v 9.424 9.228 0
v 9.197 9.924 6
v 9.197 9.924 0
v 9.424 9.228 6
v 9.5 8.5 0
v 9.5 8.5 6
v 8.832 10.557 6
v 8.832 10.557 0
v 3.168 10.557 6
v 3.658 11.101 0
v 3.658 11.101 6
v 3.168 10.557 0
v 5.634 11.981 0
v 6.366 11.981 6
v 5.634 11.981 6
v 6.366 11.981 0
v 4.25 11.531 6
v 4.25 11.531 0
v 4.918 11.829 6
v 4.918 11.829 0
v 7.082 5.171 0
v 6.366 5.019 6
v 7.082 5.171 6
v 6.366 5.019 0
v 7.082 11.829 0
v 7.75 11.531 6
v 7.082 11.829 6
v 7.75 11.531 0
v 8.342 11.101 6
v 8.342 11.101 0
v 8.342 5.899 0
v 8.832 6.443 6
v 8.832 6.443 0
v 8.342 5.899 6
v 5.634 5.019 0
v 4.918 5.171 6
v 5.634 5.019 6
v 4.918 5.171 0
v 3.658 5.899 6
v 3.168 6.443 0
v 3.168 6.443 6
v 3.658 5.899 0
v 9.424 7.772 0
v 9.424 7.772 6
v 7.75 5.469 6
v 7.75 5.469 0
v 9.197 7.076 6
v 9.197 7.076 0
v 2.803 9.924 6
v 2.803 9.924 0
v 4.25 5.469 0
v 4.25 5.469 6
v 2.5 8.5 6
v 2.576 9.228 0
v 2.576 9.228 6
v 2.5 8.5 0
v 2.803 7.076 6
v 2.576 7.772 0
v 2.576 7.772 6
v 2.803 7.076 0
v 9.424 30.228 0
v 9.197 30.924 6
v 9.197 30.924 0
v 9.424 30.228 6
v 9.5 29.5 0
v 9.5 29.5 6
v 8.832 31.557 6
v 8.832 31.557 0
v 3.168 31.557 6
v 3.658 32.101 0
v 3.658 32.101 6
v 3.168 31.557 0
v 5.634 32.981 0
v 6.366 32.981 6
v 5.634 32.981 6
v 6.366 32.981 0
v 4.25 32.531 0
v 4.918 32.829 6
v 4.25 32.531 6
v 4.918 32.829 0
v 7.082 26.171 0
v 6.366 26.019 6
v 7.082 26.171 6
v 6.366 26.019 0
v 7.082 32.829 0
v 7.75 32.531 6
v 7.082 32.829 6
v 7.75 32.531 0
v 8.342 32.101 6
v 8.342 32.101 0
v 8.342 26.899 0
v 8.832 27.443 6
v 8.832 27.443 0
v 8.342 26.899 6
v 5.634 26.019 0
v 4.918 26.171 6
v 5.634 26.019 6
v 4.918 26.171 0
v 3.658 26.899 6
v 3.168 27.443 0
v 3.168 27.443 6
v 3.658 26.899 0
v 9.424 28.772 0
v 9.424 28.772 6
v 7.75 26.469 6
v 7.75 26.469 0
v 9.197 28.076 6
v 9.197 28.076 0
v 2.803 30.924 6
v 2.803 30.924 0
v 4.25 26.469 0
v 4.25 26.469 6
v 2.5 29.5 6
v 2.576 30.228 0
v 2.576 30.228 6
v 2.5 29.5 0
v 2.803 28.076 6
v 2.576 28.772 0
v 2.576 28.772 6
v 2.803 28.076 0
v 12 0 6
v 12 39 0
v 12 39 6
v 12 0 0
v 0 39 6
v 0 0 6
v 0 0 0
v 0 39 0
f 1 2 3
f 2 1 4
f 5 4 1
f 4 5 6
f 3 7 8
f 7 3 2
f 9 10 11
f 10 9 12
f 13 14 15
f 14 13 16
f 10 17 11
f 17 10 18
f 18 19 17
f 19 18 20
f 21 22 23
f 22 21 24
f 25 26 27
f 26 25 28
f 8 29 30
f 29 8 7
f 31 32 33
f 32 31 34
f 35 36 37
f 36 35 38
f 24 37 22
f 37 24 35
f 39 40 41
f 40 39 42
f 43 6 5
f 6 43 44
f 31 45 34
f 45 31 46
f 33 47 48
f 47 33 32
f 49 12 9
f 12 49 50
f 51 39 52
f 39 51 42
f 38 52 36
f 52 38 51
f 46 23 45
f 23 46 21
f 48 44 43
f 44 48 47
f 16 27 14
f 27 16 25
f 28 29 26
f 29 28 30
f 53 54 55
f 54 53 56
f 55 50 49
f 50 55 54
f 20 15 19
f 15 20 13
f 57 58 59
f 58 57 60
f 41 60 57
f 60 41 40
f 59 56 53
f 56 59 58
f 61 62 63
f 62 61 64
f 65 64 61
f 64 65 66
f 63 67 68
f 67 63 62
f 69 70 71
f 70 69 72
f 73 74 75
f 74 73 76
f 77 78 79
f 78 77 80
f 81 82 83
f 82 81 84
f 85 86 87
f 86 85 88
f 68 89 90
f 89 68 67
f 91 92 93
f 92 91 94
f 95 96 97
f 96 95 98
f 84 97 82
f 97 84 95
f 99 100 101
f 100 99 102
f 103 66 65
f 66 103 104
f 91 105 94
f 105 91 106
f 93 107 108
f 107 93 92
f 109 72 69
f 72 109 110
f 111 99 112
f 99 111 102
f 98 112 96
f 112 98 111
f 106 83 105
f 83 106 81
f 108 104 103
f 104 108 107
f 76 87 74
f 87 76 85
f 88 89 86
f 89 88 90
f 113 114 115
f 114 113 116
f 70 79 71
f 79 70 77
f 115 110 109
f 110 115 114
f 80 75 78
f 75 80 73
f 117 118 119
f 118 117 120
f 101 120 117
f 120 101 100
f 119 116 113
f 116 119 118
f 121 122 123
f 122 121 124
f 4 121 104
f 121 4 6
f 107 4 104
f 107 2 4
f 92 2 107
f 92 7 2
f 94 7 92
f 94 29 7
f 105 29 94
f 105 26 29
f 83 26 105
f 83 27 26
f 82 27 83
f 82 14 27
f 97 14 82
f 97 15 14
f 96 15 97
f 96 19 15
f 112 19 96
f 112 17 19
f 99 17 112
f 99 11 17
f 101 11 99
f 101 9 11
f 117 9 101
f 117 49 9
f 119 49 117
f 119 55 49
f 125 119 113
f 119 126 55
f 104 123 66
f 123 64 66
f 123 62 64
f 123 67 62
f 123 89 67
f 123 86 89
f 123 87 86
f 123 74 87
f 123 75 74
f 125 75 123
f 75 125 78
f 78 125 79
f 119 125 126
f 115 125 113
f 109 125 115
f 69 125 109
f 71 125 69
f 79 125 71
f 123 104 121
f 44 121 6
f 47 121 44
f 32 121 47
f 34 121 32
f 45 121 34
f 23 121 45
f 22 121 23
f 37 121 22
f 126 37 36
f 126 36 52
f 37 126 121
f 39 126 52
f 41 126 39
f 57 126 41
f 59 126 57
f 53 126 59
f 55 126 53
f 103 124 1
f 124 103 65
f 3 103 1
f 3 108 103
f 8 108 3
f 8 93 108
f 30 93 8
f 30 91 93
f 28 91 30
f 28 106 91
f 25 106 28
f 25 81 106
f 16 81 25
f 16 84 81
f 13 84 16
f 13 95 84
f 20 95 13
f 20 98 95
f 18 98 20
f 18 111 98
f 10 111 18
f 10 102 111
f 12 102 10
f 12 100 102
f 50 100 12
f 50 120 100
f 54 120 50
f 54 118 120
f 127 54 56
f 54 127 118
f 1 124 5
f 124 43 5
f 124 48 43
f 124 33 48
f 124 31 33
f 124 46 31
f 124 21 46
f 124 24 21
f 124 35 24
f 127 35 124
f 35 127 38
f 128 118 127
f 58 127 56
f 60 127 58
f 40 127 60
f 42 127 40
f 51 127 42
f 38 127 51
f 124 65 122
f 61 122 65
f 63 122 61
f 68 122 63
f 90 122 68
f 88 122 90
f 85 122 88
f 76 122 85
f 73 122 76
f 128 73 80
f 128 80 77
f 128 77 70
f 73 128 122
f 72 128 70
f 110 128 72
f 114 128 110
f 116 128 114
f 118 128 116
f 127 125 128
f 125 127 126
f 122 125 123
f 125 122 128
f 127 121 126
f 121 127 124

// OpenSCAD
difference()
{
  d=6+1;
  cube([12, 39, 22-16]);
  #for(dy = [5+d/2, 39-6-d/2])
    translate([12/2, dy, -5])
      cylinder(r=d/2, h=20, $fs=0.1);
}
